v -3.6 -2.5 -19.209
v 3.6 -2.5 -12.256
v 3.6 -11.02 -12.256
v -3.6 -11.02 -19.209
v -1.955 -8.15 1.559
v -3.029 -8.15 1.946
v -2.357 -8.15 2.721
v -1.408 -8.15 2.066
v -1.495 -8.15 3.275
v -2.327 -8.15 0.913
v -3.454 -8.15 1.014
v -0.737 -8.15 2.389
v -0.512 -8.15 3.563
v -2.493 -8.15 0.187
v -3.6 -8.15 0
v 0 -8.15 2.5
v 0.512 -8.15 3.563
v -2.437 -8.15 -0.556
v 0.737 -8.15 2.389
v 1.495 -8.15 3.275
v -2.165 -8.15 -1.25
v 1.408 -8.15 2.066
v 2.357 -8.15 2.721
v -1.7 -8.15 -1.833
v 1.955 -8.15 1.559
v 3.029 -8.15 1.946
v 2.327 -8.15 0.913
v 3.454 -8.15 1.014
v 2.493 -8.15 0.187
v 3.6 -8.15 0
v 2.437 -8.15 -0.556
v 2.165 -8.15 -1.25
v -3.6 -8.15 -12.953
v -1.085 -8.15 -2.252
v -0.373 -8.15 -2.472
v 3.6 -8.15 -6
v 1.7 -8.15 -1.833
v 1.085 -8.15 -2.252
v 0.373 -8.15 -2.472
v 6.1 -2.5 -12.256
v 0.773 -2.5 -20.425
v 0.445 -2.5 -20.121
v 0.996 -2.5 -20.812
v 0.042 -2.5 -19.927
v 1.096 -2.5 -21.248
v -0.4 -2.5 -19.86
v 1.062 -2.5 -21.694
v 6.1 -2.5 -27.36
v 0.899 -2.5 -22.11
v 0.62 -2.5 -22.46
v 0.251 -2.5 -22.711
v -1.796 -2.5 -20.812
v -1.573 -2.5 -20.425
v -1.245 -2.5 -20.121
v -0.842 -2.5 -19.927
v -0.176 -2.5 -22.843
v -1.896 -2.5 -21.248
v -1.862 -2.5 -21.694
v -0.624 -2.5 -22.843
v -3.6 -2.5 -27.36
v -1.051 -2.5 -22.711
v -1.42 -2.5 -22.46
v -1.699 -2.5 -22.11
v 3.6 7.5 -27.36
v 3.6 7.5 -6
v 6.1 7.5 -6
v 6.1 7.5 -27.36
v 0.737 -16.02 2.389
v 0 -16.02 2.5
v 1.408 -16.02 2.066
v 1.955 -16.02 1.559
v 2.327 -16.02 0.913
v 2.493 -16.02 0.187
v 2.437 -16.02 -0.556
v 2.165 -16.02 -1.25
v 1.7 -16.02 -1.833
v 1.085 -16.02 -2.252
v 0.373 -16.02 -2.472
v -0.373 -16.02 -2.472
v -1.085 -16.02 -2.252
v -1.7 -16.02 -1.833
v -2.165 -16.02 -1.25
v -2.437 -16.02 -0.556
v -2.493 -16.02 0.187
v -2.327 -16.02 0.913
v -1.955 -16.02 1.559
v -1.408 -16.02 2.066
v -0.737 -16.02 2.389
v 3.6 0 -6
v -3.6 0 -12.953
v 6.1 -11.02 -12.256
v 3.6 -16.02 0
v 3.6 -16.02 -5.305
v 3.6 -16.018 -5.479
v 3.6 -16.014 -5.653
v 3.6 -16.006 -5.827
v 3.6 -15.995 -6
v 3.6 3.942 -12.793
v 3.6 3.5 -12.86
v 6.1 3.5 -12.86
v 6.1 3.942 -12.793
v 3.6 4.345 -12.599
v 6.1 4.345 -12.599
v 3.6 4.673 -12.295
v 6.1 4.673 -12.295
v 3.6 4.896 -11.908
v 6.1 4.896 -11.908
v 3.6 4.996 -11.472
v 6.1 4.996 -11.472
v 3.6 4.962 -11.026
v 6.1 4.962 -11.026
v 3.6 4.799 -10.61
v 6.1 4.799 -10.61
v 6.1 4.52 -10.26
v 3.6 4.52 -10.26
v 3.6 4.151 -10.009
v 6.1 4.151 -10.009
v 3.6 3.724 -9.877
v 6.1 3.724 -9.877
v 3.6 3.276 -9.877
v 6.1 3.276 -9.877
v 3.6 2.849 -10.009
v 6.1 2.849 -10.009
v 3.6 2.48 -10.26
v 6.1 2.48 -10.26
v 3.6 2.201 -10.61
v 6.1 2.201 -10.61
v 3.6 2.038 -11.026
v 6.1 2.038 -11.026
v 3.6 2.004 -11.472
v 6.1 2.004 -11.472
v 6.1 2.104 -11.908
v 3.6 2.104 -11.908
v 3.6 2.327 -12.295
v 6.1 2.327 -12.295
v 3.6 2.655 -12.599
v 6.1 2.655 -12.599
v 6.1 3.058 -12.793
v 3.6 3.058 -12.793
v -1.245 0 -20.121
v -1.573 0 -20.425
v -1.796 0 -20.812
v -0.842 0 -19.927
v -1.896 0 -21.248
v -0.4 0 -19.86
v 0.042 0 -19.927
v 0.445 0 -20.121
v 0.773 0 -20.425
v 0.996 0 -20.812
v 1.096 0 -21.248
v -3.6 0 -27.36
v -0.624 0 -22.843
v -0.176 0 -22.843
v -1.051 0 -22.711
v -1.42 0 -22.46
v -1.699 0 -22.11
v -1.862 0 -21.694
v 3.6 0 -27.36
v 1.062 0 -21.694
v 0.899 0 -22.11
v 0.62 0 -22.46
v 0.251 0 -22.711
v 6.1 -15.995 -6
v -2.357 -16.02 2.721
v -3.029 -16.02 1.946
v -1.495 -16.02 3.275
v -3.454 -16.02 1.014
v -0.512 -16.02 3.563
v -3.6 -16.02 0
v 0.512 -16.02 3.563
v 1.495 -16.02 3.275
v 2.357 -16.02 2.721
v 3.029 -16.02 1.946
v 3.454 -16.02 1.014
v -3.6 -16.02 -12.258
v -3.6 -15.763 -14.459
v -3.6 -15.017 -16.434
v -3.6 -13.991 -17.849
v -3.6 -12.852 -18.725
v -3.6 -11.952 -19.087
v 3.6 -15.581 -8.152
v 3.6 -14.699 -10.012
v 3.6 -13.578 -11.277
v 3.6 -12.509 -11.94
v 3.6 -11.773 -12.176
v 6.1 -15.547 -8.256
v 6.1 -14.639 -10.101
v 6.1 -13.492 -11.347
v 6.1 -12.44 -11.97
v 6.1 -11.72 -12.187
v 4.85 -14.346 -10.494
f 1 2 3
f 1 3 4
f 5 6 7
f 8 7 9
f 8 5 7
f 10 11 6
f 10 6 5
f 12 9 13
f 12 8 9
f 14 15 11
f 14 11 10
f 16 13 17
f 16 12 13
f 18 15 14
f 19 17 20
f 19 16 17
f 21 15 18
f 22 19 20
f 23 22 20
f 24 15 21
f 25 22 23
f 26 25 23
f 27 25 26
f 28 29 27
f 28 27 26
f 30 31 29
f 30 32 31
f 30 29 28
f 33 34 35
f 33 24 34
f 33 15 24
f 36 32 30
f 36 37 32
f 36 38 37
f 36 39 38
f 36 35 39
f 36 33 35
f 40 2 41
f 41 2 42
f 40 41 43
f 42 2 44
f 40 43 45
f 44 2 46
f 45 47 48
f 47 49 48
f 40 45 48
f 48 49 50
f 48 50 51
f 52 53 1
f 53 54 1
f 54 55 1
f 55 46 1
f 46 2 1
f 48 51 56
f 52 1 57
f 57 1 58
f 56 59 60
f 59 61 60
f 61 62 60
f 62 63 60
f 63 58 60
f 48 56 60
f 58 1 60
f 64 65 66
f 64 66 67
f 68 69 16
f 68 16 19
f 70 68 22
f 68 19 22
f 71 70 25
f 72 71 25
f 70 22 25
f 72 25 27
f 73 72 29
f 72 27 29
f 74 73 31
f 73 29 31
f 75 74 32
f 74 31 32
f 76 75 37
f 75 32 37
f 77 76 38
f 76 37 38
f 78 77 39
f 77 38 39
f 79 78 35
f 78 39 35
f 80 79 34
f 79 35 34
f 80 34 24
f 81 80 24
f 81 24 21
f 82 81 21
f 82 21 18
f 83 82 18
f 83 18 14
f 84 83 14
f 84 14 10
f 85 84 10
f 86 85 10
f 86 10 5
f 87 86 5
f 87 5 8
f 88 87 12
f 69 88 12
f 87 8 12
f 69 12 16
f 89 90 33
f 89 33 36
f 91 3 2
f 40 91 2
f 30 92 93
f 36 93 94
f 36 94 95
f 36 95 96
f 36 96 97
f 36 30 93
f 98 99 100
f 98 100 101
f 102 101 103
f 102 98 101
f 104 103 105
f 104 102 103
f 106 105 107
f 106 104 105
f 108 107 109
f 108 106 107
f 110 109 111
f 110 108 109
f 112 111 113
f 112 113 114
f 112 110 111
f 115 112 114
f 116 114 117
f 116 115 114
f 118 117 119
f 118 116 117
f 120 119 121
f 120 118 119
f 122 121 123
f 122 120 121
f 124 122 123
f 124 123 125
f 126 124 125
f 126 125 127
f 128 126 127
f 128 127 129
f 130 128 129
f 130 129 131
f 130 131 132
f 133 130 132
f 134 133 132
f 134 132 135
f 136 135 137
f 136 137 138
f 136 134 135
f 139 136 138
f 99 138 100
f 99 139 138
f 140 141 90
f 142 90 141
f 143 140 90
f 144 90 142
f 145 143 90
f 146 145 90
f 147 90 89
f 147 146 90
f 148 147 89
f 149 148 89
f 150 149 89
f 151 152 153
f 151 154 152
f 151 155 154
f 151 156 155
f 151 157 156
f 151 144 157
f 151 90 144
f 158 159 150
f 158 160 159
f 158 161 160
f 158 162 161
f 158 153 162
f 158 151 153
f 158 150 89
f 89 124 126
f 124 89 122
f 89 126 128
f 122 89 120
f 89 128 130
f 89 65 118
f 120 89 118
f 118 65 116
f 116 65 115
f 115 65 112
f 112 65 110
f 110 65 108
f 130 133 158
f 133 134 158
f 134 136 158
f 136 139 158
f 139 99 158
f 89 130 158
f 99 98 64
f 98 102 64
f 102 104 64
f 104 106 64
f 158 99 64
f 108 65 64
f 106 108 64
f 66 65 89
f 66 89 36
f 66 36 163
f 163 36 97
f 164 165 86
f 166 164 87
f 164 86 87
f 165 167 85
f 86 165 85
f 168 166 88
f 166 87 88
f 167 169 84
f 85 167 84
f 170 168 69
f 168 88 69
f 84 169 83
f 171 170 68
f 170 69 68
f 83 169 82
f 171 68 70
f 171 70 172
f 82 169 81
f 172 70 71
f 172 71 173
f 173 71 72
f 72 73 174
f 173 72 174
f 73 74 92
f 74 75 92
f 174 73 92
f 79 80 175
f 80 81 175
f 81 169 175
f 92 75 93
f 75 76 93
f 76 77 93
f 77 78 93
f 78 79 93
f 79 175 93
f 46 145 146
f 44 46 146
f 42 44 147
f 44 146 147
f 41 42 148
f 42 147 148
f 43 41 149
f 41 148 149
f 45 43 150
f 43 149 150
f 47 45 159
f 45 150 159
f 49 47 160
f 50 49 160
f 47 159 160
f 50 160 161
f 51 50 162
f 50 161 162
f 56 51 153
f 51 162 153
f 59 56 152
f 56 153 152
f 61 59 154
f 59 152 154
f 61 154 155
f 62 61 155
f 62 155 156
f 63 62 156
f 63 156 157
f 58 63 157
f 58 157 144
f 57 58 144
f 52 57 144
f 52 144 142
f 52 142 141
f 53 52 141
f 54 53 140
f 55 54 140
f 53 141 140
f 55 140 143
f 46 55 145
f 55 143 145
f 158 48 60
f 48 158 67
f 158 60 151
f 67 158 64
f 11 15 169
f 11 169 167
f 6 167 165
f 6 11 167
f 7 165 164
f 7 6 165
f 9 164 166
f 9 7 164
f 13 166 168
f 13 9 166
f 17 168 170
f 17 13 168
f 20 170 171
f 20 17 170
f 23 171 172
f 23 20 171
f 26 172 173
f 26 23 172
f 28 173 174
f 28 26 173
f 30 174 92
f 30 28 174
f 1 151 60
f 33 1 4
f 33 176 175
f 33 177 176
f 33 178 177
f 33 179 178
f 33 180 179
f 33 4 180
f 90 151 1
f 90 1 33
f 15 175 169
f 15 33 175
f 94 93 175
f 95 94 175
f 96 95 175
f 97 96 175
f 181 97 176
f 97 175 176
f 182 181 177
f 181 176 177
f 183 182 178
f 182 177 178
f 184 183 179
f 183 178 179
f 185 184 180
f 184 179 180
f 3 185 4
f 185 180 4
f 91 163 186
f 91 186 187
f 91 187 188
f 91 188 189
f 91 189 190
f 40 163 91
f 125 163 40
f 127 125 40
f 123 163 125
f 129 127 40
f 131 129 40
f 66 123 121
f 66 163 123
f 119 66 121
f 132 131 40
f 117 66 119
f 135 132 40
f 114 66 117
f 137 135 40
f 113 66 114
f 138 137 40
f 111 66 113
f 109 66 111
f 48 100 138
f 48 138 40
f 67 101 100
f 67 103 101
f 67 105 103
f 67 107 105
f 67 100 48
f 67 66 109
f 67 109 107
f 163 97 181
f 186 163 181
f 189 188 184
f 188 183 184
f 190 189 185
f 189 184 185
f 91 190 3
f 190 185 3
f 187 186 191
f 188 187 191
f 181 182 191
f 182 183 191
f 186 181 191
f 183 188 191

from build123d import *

# Parameters (mm, degrees)
CROQUIS1_R              = 1.5
SALIENTE_EXTRUIR1_DEPTH = 2.5
SALIENTE_EXTRUIR2_START = -8.15
CROQUIS1_4_R            = 2.5
SALIENTE_EXTRUIR2_DEPTH = 7.87
SALIENTE_EXTRUIR3_DEPTH = 16.02
REDONDEO1_R             = 5
CROQUIS3_W              = 21.36
CROQUIS3_H              = 7.5
CROQUIS3_R              = 1.5
SALIENTE_EXTRUIR4_DEPTH = 2.5


with BuildPart() as part:
    # Croquis1 → Saliente-Extruir1 (new body)
    # profile 1 of 2: a face of its own
    with BuildSketch(Plane(origin=(0, 0, 0), x_dir=(1, 0, 0), z_dir=(0, 1, 0))):
        Polygon((3.6, 27.36), (-3.6, 27.36), (-3.6, 19.208695338), (3.6, 12.25573616), align=None)
        with Locations(Location((-0.4, 21.36, 0), (0, 0, 270))):
            Circle(CROQUIS1_R, mode=Mode.SUBTRACT)
    # profile 2 of 2: a face of its own
    with BuildSketch(Plane(origin=(0, 0, 0), x_dir=(1, 0, 0), z_dir=(0, 1, 0))):
        Polygon((3.6, 12.25573616), (-3.6, 19.208695338), (-3.6, 12.952959179), (3.6, 6), align=None)
    extrude(amount=-SALIENTE_EXTRUIR1_DEPTH)



with BuildPart() as body_2:
    # Croquis1<4> → Saliente-Extruir2 (new body)
    with BuildSketch(Plane(origin=(0, 0, 0), x_dir=(1, 0, 0), z_dir=(0, 1, 0)).offset(SALIENTE_EXTRUIR2_START)):
        with BuildLine():
            Line((3.6, 6), (-3.6, 12.952959179))
            Line((-3.6, 12.952959179), (-3.6, 0))
            ThreePointArc((-3.6, 0), (0, -3.6), (3.6, 0))
            Line((3.6, 0), (3.6, 6))
        make_face()
        with Locations(Location((0, 0, 0), (0, 0, 270))):
            Circle(CROQUIS1_4_R, mode=Mode.SUBTRACT)
    extrude(amount=-SALIENTE_EXTRUIR2_DEPTH)


with BuildPart() as part_1:
    add(part.part)

    add(body_2.part)  # Saliente-Extruir3 merges body 2
    # Croquis1<5> → Saliente-Extruir3 (add)
    with BuildSketch(Plane(origin=(0, 0, 0), x_dir=(1, 0, 0), z_dir=(0, 1, 0))):
        Polygon((3.6, 12.25573616), (-3.6, 19.208695338), (-3.6, 12.952959179), (3.6, 6), align=None)
    extrude(amount=-SALIENTE_EXTRUIR3_DEPTH)

    # Redondeo1
    redondeo1_edges = [part_1.edges().sort_by_distance(p)[0] for p in [
        (0, -16.02, -15.732215749),
    ]]
    fillet(redondeo1_edges, radius=REDONDEO1_R)

    # Croquis3 → Saliente-Extruir4 (add)
    # profile 1 of 2: a face of its own
    with BuildSketch(Plane(origin=(3.6, 0, 0), x_dir=(0, 0, -1), z_dir=(1, 0, 0))):
        with BuildLine():
            Line((6, 0), (6, -8.15))
            Line((6, -8.15), (6, -15.994937186))
            add(Edge.make_bspline(
                [(6, -15.994937186), (12.25573616, -15.542670169), (12.25573616, -11.02)],
                knots=[4.821475205, 4.821475205, 4.821475205, 6.283185307, 6.283185307, 6.283185307], degree=2, weights=[0.962144349, 0.727447175, 1]))
            Line((12.25573616, -11.02), (12.25573616, -2.5))
            Line((12.25573616, -2.5), (27.36, -2.5))
            Line((27.36, -2.5), (27.36, 0))
            Line((27.36, 0), (6, 0))
        make_face()
    # profile 2 of 2: a face of its own
    with BuildSketch(Plane(origin=(3.6, 0, 0), x_dir=(0, 0, -1), z_dir=(1, 0, 0))):
        with Locations((16.68, 3.75)):
            Rectangle(CROQUIS3_W, CROQUIS3_H)
        with Locations((11.36, 3.5)):
            Circle(CROQUIS3_R, mode=Mode.SUBTRACT)
    extrude(amount=SALIENTE_EXTRUIR4_DEPTH)


solid = part_1.part
